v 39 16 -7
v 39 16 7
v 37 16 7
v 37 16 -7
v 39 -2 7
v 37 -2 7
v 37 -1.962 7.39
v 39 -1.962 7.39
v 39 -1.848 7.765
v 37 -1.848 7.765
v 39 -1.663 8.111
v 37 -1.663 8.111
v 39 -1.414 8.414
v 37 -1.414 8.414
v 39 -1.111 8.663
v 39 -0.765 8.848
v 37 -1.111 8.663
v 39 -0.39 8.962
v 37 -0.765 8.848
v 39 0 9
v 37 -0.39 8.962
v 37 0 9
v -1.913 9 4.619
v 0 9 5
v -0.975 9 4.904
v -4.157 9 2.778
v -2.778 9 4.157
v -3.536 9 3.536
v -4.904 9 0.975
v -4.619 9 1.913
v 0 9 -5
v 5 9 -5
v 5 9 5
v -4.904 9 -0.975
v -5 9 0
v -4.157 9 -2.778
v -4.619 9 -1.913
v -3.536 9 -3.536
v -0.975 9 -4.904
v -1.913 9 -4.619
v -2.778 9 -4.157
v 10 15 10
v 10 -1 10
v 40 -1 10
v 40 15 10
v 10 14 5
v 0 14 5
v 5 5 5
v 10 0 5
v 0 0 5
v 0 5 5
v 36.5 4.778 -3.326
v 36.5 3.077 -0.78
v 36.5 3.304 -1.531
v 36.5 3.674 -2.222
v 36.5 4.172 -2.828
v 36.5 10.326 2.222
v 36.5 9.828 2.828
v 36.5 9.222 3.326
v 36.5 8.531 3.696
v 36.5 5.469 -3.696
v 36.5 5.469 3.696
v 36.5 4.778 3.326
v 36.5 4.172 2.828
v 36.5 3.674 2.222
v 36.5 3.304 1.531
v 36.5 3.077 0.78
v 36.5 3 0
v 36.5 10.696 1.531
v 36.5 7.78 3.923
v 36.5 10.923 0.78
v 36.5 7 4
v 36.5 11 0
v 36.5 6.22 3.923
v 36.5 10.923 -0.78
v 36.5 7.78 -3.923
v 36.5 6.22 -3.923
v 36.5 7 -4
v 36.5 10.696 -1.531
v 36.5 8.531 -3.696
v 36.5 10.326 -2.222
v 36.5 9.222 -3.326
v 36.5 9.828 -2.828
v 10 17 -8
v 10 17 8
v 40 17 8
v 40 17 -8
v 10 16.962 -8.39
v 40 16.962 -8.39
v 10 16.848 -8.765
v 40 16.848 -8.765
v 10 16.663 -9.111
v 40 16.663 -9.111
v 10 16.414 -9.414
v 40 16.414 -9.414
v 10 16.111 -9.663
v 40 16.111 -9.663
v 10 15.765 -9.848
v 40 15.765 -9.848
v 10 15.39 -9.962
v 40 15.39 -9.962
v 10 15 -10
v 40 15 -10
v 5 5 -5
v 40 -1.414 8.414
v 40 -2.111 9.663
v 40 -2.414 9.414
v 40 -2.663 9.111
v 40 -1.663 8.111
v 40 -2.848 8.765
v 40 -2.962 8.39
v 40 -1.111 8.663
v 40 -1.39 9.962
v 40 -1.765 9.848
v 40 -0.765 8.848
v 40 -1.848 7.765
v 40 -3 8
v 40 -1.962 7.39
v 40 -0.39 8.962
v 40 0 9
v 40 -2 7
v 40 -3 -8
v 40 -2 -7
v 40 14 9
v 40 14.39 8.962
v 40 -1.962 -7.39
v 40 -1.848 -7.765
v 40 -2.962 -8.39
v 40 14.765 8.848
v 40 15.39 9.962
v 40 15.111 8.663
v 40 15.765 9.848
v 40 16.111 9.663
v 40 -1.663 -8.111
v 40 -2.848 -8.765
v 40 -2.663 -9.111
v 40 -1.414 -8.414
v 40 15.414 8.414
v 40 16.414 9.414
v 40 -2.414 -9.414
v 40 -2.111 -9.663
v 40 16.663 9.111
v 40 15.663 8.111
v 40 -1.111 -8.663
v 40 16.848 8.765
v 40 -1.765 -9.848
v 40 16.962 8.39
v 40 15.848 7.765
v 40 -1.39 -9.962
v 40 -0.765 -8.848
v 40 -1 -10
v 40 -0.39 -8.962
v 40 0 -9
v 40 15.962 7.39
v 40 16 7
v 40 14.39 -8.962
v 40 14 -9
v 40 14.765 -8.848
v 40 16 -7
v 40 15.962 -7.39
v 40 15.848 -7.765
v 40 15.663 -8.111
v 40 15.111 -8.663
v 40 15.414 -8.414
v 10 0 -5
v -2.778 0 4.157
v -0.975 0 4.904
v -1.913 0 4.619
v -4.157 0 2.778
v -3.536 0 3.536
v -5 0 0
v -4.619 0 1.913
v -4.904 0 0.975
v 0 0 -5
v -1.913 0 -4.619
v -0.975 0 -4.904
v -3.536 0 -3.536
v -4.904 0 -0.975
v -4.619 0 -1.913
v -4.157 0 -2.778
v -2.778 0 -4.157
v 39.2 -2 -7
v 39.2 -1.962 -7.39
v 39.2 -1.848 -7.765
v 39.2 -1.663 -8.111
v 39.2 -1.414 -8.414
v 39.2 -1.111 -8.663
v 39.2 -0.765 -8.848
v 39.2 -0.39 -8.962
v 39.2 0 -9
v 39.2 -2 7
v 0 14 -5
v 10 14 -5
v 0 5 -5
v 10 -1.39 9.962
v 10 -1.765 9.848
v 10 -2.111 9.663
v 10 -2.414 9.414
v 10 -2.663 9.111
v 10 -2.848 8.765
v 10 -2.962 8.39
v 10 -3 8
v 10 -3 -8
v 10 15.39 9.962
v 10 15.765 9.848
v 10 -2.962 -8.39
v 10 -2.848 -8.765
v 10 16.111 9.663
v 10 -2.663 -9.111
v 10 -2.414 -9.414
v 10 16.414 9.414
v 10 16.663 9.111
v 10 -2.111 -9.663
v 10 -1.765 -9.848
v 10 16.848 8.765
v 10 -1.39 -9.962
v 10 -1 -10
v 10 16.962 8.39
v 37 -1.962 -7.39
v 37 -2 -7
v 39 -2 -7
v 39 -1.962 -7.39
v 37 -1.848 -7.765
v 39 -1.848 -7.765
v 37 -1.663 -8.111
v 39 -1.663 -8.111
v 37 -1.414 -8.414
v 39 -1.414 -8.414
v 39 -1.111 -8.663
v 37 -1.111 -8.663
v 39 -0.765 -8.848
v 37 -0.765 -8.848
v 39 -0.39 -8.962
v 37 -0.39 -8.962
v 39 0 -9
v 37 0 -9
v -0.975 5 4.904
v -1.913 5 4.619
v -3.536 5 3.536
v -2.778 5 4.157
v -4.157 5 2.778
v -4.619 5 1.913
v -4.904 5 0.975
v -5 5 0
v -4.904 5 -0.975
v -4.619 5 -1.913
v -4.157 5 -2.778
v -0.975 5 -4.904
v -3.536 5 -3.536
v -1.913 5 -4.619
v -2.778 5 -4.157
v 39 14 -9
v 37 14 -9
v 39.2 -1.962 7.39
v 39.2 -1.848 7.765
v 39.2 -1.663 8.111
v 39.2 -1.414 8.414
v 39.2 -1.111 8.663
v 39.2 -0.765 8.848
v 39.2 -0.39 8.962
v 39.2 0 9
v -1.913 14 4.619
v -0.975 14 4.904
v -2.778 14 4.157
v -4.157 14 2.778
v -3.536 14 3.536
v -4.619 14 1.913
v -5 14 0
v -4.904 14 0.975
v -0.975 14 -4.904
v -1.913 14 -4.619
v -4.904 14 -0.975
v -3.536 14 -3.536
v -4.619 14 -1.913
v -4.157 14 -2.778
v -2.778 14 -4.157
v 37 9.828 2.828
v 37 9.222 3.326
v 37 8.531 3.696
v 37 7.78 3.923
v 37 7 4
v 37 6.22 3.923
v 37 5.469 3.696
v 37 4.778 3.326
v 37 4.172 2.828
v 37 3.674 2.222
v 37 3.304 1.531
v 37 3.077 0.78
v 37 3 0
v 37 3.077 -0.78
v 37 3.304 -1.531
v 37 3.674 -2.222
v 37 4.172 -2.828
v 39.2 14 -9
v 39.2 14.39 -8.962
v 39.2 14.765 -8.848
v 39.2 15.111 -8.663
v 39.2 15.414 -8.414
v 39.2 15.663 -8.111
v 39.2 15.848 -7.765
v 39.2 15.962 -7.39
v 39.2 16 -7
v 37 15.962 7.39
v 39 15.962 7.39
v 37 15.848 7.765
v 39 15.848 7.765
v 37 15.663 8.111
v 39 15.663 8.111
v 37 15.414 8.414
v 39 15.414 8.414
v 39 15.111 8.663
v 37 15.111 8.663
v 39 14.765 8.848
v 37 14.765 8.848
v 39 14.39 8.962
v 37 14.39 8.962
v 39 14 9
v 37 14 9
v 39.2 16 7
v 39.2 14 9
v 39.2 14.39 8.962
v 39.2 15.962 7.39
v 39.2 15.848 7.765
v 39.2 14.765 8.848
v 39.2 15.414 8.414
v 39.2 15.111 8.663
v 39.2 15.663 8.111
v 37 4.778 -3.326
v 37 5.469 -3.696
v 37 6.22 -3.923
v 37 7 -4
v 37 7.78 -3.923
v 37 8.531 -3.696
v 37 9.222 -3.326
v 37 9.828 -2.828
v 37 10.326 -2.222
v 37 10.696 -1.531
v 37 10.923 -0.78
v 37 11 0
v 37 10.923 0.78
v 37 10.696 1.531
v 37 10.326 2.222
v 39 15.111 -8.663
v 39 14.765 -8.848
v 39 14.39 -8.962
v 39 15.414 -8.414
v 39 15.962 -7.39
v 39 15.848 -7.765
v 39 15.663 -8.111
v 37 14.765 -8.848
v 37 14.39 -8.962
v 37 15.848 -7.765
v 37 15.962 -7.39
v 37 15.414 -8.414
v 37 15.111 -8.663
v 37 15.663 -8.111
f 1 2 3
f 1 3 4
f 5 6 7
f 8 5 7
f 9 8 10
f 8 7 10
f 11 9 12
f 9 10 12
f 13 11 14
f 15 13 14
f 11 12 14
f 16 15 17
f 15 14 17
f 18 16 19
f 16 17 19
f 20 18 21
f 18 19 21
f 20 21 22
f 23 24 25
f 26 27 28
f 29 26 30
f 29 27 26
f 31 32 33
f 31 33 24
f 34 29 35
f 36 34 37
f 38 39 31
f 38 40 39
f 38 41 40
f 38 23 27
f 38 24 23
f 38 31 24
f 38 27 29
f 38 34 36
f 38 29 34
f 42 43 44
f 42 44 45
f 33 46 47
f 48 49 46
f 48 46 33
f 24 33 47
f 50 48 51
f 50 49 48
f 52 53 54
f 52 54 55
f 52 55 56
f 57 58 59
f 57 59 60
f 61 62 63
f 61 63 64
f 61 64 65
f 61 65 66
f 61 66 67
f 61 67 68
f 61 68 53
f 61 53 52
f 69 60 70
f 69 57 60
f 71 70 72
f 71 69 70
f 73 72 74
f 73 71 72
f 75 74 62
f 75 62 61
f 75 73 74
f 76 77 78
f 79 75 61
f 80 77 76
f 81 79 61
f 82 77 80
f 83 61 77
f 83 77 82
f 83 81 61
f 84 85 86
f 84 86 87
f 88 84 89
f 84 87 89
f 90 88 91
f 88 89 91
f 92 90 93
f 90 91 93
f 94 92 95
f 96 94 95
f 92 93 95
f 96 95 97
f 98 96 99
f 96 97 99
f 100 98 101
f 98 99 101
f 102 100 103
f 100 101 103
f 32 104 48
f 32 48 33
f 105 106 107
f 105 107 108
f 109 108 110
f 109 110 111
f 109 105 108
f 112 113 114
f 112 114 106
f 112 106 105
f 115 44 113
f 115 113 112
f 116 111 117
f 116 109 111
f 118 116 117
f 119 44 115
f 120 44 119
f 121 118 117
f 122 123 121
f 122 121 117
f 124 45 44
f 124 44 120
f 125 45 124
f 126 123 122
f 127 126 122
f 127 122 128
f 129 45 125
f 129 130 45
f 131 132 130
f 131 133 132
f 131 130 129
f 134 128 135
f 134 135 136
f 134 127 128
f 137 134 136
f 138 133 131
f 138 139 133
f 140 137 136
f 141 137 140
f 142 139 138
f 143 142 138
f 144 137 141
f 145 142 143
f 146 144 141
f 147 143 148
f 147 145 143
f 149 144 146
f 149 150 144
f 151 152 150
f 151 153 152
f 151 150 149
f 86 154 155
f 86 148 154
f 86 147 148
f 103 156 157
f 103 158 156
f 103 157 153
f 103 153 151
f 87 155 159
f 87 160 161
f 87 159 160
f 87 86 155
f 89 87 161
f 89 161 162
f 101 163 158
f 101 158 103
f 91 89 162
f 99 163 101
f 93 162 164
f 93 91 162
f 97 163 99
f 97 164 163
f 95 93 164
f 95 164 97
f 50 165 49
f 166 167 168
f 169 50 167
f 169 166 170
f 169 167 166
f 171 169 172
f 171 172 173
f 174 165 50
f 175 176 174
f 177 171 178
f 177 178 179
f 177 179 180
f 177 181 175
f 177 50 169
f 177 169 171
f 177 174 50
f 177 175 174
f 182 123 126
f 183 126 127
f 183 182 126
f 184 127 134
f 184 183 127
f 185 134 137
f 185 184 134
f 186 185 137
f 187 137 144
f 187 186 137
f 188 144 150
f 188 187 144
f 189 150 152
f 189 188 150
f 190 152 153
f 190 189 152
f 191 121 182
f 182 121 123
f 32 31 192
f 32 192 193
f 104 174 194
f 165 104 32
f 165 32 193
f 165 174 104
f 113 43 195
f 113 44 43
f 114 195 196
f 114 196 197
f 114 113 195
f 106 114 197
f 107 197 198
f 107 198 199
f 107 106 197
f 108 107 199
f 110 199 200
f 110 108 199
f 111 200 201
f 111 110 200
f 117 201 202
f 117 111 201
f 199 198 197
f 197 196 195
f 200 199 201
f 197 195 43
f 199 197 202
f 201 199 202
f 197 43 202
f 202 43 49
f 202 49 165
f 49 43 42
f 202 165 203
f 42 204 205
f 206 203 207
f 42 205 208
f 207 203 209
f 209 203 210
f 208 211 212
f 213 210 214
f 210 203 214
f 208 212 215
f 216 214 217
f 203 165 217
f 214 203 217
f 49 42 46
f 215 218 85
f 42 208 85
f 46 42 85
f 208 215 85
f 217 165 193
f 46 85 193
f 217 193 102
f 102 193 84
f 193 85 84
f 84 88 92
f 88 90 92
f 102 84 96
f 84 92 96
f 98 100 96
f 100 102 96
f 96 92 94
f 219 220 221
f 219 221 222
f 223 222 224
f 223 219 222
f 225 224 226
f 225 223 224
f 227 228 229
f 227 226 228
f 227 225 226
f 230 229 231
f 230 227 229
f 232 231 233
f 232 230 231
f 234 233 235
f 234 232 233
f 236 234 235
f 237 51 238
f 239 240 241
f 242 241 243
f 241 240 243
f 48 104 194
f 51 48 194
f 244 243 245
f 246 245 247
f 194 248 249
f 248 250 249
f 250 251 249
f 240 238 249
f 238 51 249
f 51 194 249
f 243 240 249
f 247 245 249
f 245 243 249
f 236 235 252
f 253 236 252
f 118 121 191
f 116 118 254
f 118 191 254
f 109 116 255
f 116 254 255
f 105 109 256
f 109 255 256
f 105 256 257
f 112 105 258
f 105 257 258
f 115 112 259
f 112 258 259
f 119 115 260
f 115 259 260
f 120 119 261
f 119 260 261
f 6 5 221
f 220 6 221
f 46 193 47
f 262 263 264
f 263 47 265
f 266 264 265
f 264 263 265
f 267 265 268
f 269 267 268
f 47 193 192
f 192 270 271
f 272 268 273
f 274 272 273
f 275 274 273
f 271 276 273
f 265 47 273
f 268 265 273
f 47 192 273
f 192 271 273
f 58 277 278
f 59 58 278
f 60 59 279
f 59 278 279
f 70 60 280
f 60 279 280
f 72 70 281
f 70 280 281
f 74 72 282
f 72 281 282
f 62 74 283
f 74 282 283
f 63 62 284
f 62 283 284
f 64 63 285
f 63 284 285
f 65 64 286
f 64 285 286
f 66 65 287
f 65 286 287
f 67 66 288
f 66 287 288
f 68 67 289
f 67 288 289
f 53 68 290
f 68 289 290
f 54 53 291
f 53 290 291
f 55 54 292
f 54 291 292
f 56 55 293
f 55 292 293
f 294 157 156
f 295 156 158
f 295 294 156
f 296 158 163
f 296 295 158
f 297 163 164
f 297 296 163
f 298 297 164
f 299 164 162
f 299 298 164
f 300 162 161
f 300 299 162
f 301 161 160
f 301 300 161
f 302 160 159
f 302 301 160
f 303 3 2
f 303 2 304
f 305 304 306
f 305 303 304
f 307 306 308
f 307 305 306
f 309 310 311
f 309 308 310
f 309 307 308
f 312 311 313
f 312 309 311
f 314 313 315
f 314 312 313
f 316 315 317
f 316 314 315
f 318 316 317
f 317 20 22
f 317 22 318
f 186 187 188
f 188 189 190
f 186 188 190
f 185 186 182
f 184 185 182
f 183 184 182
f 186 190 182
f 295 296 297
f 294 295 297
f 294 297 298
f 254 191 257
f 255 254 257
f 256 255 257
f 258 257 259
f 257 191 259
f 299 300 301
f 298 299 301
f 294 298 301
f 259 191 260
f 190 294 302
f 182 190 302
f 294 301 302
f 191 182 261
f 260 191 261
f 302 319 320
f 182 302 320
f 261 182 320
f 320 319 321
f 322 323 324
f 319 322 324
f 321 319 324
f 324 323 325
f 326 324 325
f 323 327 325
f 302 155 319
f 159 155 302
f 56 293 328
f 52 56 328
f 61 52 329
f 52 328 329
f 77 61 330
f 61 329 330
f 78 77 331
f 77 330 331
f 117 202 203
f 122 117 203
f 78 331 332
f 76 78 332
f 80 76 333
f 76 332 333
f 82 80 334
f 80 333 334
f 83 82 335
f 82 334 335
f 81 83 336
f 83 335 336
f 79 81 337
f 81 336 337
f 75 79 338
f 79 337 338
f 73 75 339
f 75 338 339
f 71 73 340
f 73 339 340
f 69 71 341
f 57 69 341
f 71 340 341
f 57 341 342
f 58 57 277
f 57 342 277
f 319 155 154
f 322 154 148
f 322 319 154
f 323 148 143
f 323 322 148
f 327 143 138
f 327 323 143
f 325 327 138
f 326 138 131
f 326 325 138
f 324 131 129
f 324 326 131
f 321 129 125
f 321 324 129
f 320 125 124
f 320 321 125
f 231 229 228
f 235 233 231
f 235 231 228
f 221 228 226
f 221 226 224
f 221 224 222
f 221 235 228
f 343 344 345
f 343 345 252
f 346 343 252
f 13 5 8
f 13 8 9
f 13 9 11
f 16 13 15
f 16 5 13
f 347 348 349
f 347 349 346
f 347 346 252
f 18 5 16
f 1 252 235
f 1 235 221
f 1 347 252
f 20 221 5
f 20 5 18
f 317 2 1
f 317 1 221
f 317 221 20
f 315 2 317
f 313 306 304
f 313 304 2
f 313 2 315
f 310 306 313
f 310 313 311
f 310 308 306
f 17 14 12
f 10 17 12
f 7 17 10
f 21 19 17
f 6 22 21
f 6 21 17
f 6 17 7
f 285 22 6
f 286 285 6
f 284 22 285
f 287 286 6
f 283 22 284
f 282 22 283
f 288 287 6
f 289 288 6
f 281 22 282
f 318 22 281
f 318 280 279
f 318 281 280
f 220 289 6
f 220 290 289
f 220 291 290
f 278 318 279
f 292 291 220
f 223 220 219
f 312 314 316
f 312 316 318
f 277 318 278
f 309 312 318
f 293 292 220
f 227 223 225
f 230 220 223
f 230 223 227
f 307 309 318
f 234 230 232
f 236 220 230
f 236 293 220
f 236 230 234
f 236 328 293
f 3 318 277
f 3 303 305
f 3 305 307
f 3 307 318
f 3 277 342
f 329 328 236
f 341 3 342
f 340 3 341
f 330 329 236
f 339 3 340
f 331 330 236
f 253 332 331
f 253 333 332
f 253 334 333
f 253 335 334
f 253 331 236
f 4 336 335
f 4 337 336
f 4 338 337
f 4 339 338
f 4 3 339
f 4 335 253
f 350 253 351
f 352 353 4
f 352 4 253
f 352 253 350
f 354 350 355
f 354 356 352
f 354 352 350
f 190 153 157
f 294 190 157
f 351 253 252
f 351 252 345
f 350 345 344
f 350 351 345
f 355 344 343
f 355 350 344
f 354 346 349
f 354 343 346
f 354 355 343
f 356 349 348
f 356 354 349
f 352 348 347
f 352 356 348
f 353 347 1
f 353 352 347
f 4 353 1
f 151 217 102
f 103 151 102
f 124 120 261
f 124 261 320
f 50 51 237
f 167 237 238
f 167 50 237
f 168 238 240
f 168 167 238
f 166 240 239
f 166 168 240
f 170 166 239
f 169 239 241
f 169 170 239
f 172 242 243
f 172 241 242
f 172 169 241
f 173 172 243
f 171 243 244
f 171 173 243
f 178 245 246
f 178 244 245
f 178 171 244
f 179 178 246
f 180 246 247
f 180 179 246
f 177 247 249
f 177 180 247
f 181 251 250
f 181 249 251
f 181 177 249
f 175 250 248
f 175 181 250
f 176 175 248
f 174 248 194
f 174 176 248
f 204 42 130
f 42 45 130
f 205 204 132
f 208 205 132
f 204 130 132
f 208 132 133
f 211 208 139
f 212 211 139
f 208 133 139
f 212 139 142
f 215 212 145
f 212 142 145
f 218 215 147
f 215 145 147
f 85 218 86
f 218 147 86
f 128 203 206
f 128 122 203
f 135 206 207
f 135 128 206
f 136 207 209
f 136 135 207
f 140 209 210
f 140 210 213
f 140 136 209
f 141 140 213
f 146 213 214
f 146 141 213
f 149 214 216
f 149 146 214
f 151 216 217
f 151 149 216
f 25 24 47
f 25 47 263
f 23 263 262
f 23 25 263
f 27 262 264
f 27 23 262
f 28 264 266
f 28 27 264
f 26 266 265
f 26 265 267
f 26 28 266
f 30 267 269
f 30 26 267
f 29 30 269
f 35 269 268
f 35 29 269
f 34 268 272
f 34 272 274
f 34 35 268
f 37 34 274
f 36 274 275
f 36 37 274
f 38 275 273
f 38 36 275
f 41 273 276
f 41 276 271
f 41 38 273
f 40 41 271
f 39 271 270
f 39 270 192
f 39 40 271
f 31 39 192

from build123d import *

# Parameters (mm, degrees)
BOSS_EXTRUDE1_DEPTH = 14
SKETCH3_W           = 20
SKETCH3_H           = 20
BOSS_EXTRUDE2_DEPTH = 30
SKETCH4_W           = 18
SKETCH4_H           = 18
CUT_EXTRUDE1_DEPTH  = 3
FILLET2_R           = 2
FILLET3_R           = 2
CUT_EXTRUDE2_DEPTH  = 0.5
BOSS_EXTRUDE3_DEPTH = 0.2
SKETCH8_W           = 10
SKETCH8_H           = 4
CUT_EXTRUDE4_DEPTH  = 20


with BuildPart() as part:
    # Sketch1 → Boss-Extrude1 (new body)
    with BuildSketch(Plane(origin=(0, 0, 0), x_dir=(1, 0, 0), z_dir=(0, 1, 0))):
        with BuildLine():
            Line((0, 5), (10, 5))
            Line((10, 5), (10, -5))
            Line((10, -5), (0, -5))
            ThreePointArc((0, -5), (-5, 0), (0, 5))
        make_face()
    extrude(amount=BOSS_EXTRUDE1_DEPTH)

    # Sketch3 → Boss-Extrude2 (add)
    with BuildSketch(Plane(origin=(10, 0, 0), x_dir=(0, 0, -1), z_dir=(1, 0, 0))):
        with Locations((0, 7)):
            Rectangle(SKETCH3_W, SKETCH3_H)
    extrude(amount=BOSS_EXTRUDE2_DEPTH)

    # Sketch4 → Cut-Extrude1 (cut)
    with BuildSketch(Plane(origin=(40, 0, 0), x_dir=(0, 0, -1), z_dir=(1, 0, 0))):
        with Locations((0, 7)):
            Rectangle(SKETCH4_W, SKETCH4_H)
    extrude(amount=-CUT_EXTRUDE1_DEPTH, mode=Mode.SUBTRACT)

    # Fillet2
    fillet2_edges = [part.edges().sort_by_distance(p)[0] for p in [
        (25, -3, -10),
        (25, 17, -10),
        (25, 17, 10),
        (25, -3, 10),
    ]]
    fillet(fillet2_edges, radius=FILLET2_R)

    # Fillet3
    fillet3_edges = [part.edges().sort_by_distance(p)[0] for p in [
        (38.5, 16, -9),
        (38.5, -2, -9),
        (38.5, -2, 9),
        (38.5, 16, 9),
    ]]
    fillet(fillet3_edges, radius=FILLET3_R)

    # Sketch5 → Cut-Extrude2 (cut)
    with BuildSketch(Plane(origin=(37, 0, 0), x_dir=(0, 0, -1), z_dir=(1, 0, 0))):
        with BuildLine():
            ThreePointArc((4, 7), (1.530733729, 10.69551813), (-2.828427125, 9.828427125))
            Line((-2.828427125, 9.828427125), (2.828427125, 4.171572875))
            ThreePointArc((2.828427125, 4.171572875), (3.69551813, 5.469266271), (4, 7))
        make_face()
        with BuildLine():
            Line((2.828427125, 4.171572875), (-2.828427125, 9.828427125))
            ThreePointArc((-2.828427125, 9.828427125), (-2.828427125, 4.171572875), (2.828427125, 4.171572875))
        make_face()
    extrude(amount=-CUT_EXTRUDE2_DEPTH, mode=Mode.SUBTRACT)

    # Sketch6 → Boss-Extrude3 (add)
    with BuildSketch(Plane(origin=(39, 0, 0), x_dir=(0, 0, -1), z_dir=(1, 0, 0))):
        with BuildLine():
            Line((-7, 16), (7, 16))
            ThreePointArc((7, 16), (8.414213562, 15.414213562), (9, 14))
            Line((9, 14), (9, 0))
            ThreePointArc((9, 0), (8.414213562, -1.414213562), (7, -2))
            Line((7, -2), (-7, -2))
            ThreePointArc((-7, -2), (-8.414213562, -1.414213562), (-9, 0))
            Line((-9, 0), (-9, 14))
            ThreePointArc((-9, 14), (-8.414213562, 15.414213562), (-7, 16))
        make_face()
    extrude(amount=BOSS_EXTRUDE3_DEPTH)

    # Sketch8 → Cut-Extrude4 (cut)
    with BuildSketch(Plane(origin=(0, 0, -5), x_dir=(-1, 0, 0), z_dir=(0, 0, -1))):
        with Locations((0, 7)):
            Rectangle(SKETCH8_W, SKETCH8_H)
    extrude(amount=-CUT_EXTRUDE4_DEPTH, mode=Mode.SUBTRACT)


solid = part.part
